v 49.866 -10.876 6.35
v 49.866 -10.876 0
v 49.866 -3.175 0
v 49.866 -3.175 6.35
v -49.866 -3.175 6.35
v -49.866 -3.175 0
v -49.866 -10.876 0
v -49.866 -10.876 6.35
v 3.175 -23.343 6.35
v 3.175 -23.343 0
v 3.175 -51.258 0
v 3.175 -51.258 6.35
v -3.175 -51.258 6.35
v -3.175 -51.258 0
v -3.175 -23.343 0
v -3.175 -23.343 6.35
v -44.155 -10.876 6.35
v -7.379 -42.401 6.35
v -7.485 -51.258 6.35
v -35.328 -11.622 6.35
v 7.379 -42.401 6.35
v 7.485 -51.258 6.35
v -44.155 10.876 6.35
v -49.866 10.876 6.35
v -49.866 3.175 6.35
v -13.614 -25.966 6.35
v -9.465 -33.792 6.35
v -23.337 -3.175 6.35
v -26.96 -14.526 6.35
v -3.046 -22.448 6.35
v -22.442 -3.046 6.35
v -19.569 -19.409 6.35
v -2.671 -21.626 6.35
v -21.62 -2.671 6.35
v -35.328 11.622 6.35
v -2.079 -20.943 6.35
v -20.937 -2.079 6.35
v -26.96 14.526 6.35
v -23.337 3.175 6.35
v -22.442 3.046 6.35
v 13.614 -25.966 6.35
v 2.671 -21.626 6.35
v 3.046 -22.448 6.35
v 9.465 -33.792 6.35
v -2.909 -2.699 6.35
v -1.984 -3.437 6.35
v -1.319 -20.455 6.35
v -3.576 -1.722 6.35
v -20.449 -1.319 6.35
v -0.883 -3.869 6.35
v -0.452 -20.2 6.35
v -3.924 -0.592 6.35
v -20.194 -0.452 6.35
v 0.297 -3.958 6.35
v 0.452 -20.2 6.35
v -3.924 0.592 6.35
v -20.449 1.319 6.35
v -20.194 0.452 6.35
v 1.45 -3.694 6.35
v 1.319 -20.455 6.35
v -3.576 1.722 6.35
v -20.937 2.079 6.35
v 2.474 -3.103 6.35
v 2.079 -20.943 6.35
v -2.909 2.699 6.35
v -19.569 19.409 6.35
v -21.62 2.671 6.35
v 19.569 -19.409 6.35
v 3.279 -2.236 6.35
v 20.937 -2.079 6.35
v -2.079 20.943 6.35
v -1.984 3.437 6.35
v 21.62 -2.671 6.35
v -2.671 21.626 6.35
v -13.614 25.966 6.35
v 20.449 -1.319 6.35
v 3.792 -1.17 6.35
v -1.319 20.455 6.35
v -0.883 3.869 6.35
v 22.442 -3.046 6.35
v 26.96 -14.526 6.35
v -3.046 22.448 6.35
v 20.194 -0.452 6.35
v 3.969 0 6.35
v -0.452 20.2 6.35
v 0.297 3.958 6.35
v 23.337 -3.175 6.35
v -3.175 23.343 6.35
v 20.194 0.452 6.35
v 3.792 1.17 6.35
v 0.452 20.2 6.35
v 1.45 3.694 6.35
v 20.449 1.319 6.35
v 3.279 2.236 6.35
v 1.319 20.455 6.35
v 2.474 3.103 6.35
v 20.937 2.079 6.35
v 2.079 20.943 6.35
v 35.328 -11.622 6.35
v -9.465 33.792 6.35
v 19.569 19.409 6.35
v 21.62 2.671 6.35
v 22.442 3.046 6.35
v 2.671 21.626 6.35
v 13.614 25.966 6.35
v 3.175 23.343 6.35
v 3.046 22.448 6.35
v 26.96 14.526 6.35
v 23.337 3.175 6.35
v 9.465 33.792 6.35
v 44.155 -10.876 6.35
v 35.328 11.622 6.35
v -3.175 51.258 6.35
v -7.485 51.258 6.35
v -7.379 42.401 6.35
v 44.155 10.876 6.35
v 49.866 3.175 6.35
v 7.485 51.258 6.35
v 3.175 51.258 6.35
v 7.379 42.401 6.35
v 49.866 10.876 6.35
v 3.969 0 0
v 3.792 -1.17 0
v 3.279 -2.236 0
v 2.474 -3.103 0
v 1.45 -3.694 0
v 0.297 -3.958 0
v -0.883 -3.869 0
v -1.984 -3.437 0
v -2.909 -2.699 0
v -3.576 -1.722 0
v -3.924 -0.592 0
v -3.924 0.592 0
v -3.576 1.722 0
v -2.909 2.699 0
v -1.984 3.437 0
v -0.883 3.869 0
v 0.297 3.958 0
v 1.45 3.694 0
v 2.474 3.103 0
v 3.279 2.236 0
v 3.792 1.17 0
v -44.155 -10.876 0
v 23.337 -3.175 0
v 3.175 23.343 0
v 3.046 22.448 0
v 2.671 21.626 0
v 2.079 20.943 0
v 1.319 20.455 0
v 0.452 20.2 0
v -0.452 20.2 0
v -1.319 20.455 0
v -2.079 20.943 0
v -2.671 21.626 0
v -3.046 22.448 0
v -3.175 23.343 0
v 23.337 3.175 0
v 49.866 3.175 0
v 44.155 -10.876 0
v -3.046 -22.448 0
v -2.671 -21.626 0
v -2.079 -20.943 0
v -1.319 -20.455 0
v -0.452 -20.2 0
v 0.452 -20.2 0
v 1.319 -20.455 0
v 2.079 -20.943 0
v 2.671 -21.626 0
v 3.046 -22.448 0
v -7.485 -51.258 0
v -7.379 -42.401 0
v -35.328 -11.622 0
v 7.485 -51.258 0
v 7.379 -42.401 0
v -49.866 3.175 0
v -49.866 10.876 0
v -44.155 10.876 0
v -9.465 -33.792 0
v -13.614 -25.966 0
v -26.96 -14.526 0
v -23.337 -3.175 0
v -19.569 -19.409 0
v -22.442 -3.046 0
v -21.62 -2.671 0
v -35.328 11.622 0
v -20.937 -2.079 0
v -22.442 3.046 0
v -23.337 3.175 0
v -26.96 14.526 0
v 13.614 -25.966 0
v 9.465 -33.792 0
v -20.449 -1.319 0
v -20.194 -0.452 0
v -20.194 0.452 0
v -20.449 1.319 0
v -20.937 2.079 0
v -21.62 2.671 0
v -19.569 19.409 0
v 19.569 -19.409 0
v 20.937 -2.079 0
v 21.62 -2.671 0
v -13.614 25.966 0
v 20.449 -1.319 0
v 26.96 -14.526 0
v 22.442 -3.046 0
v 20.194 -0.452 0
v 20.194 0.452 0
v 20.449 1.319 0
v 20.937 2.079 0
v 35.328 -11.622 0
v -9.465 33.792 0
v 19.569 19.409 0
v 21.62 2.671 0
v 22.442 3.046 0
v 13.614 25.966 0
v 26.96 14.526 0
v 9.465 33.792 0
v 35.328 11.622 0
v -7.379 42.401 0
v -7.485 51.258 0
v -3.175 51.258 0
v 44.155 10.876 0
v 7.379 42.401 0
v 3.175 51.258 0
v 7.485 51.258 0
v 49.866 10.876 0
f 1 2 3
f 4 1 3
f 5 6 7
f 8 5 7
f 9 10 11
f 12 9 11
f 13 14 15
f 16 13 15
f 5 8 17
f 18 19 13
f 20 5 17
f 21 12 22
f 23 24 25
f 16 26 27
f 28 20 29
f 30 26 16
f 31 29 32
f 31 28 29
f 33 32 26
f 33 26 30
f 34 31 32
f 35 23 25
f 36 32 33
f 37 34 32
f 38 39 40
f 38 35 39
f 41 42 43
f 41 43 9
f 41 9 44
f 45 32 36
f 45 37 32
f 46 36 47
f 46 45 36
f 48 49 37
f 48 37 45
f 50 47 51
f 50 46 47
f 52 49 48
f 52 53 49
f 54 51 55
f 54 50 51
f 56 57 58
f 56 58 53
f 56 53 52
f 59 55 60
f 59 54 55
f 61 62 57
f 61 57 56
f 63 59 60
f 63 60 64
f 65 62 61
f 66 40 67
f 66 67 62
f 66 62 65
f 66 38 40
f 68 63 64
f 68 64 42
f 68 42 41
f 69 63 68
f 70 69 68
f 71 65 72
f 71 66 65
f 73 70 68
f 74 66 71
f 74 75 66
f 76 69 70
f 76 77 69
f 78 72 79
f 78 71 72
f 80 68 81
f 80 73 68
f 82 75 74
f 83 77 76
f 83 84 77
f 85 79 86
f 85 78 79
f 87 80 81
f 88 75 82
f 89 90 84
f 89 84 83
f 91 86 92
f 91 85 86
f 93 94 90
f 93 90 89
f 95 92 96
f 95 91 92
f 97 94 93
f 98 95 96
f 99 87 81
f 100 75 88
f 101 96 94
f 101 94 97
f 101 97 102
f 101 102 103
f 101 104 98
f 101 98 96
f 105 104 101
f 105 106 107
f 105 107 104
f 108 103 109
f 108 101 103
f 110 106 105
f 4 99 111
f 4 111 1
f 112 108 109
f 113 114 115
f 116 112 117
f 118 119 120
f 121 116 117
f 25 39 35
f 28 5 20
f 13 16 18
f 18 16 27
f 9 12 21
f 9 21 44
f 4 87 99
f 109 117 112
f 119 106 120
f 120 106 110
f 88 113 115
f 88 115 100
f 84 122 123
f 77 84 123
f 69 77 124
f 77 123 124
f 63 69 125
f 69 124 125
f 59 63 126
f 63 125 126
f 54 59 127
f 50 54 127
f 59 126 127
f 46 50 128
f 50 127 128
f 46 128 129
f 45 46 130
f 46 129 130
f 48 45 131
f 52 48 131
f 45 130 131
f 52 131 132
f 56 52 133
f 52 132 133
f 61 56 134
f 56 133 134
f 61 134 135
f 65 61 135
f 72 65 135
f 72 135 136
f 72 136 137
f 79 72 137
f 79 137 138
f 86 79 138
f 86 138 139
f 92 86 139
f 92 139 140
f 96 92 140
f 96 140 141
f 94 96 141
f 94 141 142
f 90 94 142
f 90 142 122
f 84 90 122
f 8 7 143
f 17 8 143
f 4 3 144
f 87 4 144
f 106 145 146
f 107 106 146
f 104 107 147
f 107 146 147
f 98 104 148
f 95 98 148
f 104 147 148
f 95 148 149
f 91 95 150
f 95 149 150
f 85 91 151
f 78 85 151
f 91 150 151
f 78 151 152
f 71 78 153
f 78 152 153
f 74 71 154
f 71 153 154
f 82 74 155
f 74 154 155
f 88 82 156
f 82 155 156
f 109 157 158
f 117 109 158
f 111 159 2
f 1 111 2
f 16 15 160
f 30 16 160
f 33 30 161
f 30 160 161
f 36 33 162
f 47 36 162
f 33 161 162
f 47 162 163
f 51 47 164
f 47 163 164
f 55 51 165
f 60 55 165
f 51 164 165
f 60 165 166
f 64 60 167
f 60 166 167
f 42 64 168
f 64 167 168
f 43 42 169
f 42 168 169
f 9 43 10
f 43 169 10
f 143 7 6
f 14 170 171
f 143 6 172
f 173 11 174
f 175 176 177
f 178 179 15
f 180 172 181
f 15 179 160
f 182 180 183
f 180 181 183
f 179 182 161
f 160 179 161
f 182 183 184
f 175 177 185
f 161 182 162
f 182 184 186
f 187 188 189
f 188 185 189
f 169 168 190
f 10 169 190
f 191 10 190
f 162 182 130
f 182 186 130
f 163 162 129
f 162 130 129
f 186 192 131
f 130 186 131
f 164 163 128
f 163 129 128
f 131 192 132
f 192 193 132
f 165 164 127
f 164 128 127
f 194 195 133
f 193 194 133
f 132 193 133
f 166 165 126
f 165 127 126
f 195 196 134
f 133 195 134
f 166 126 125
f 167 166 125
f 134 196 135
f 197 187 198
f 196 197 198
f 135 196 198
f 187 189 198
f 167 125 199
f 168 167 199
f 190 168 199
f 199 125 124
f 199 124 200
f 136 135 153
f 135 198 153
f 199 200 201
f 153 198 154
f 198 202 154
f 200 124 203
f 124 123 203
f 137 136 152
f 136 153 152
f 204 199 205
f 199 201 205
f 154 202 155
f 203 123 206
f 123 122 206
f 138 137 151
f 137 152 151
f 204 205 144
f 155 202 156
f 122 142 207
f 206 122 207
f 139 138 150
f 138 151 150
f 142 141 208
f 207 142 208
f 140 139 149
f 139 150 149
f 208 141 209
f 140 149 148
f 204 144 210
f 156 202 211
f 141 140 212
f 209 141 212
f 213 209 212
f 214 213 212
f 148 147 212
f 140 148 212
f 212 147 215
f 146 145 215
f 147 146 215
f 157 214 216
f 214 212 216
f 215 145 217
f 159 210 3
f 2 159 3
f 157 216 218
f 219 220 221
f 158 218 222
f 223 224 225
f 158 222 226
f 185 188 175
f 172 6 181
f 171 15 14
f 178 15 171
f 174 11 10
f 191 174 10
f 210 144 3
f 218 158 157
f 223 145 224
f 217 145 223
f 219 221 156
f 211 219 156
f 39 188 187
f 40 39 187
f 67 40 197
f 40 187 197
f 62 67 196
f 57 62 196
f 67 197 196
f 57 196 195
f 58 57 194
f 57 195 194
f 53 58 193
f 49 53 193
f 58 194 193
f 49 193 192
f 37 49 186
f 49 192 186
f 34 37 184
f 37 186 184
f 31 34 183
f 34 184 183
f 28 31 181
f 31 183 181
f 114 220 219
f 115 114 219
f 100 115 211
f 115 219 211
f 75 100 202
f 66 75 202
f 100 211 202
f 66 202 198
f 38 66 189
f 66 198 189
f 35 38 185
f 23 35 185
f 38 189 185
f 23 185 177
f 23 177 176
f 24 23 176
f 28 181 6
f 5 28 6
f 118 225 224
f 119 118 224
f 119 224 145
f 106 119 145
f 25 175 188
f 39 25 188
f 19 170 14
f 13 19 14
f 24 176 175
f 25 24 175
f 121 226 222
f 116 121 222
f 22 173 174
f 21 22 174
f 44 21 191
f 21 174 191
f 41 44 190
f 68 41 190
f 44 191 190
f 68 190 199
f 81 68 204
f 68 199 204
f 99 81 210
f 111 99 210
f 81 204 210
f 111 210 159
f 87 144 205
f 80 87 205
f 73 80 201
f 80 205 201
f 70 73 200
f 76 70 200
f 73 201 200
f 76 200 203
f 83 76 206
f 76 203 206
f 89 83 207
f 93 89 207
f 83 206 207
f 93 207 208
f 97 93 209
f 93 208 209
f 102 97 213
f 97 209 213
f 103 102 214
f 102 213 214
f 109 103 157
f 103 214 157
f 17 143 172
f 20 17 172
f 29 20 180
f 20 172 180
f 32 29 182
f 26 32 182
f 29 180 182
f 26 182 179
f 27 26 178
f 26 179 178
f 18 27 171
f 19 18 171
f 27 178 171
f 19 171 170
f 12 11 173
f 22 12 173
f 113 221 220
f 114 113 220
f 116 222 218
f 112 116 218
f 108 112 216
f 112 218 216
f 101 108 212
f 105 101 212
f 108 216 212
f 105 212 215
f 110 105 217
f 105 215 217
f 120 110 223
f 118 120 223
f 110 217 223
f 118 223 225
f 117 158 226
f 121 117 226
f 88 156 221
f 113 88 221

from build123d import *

# Parameters (mm, degrees)
F1_DEPTH = 6.35
F2_R     = 3.96875
F3_DEPTH = 45.73795


with BuildPart() as f1:
    # F0 (on Top) → F1 (new body)
    with BuildSketch(Plane.XY):
        with BuildLine():
            ThreePointArc((-7.484571, 51.258114), (-16.386664, 22.501379), (-44.15456, 10.876361))
            Line((-44.15456, 10.876361), (-49.865723, 10.876361))
            Line((-49.865723, 10.876361), (-49.865723, 3.175))
            Line((-49.865723, 3.175), (-23.336682, 3.175))
            ThreePointArc((-23.336682, 3.175), (-20.161682, 0), (-23.336682, -3.175))
            Line((-23.336682, -3.175), (-49.865723, -3.175))
            Line((-49.865723, -3.175), (-49.865723, -10.876361))
            Line((-49.865723, -10.876361), (-44.15456, -10.876361))
            ThreePointArc((-44.15456, -10.876361), (-16.386664, -22.501379), (-7.484571, -51.258114))
            Line((-7.484571, -51.258114), (-3.175, -51.258114))
            Line((-3.175, -51.258114), (-3.175, -23.3426))
            ThreePointArc((-3.175, -23.3426), (0, -20.1676), (3.175, -23.3426))
            Line((3.175, -23.3426), (3.175, -51.258114))
            Line((3.175, -51.258114), (7.484571, -51.258114))
            ThreePointArc((7.484571, -51.258114), (16.386664, -22.501379), (44.15456, -10.876361))
            Line((44.15456, -10.876361), (49.865723, -10.876361))
            Line((49.865723, -10.876361), (49.865723, -3.175))
            Line((49.865723, -3.175), (23.336682, -3.175))
            ThreePointArc((23.336682, -3.175), (20.161682, 0), (23.336682, 3.175))
            Line((23.336682, 3.175), (49.865723, 3.175))
            Line((49.865723, 3.175), (49.865723, 10.876361))
            Line((49.865723, 10.876361), (44.15456, 10.876361))
            ThreePointArc((44.15456, 10.876361), (16.386664, 22.501379), (7.484571, 51.258114))
            Line((7.484571, 51.258114), (3.175, 51.258114))
            Line((3.175, 51.258114), (3.175, 23.3426))
            ThreePointArc((3.175, 23.3426), (0, 20.1676), (-3.175, 23.3426))
            Line((-3.175, 23.3426), (-3.175, 51.258114))
            Line((-3.175, 51.258114), (-7.484571, 51.258114))
        make_face()
    extrude(amount=F1_DEPTH)

    # F2 (on face) → F3 (cut)
    with BuildSketch(Plane(origin=(0, 0, 0), x_dir=(1, 0, 0), z_dir=(0, 0, -1))):
        Circle(F2_R)
    extrude(amount=-F3_DEPTH, mode=Mode.SUBTRACT)


solid = f1.part
